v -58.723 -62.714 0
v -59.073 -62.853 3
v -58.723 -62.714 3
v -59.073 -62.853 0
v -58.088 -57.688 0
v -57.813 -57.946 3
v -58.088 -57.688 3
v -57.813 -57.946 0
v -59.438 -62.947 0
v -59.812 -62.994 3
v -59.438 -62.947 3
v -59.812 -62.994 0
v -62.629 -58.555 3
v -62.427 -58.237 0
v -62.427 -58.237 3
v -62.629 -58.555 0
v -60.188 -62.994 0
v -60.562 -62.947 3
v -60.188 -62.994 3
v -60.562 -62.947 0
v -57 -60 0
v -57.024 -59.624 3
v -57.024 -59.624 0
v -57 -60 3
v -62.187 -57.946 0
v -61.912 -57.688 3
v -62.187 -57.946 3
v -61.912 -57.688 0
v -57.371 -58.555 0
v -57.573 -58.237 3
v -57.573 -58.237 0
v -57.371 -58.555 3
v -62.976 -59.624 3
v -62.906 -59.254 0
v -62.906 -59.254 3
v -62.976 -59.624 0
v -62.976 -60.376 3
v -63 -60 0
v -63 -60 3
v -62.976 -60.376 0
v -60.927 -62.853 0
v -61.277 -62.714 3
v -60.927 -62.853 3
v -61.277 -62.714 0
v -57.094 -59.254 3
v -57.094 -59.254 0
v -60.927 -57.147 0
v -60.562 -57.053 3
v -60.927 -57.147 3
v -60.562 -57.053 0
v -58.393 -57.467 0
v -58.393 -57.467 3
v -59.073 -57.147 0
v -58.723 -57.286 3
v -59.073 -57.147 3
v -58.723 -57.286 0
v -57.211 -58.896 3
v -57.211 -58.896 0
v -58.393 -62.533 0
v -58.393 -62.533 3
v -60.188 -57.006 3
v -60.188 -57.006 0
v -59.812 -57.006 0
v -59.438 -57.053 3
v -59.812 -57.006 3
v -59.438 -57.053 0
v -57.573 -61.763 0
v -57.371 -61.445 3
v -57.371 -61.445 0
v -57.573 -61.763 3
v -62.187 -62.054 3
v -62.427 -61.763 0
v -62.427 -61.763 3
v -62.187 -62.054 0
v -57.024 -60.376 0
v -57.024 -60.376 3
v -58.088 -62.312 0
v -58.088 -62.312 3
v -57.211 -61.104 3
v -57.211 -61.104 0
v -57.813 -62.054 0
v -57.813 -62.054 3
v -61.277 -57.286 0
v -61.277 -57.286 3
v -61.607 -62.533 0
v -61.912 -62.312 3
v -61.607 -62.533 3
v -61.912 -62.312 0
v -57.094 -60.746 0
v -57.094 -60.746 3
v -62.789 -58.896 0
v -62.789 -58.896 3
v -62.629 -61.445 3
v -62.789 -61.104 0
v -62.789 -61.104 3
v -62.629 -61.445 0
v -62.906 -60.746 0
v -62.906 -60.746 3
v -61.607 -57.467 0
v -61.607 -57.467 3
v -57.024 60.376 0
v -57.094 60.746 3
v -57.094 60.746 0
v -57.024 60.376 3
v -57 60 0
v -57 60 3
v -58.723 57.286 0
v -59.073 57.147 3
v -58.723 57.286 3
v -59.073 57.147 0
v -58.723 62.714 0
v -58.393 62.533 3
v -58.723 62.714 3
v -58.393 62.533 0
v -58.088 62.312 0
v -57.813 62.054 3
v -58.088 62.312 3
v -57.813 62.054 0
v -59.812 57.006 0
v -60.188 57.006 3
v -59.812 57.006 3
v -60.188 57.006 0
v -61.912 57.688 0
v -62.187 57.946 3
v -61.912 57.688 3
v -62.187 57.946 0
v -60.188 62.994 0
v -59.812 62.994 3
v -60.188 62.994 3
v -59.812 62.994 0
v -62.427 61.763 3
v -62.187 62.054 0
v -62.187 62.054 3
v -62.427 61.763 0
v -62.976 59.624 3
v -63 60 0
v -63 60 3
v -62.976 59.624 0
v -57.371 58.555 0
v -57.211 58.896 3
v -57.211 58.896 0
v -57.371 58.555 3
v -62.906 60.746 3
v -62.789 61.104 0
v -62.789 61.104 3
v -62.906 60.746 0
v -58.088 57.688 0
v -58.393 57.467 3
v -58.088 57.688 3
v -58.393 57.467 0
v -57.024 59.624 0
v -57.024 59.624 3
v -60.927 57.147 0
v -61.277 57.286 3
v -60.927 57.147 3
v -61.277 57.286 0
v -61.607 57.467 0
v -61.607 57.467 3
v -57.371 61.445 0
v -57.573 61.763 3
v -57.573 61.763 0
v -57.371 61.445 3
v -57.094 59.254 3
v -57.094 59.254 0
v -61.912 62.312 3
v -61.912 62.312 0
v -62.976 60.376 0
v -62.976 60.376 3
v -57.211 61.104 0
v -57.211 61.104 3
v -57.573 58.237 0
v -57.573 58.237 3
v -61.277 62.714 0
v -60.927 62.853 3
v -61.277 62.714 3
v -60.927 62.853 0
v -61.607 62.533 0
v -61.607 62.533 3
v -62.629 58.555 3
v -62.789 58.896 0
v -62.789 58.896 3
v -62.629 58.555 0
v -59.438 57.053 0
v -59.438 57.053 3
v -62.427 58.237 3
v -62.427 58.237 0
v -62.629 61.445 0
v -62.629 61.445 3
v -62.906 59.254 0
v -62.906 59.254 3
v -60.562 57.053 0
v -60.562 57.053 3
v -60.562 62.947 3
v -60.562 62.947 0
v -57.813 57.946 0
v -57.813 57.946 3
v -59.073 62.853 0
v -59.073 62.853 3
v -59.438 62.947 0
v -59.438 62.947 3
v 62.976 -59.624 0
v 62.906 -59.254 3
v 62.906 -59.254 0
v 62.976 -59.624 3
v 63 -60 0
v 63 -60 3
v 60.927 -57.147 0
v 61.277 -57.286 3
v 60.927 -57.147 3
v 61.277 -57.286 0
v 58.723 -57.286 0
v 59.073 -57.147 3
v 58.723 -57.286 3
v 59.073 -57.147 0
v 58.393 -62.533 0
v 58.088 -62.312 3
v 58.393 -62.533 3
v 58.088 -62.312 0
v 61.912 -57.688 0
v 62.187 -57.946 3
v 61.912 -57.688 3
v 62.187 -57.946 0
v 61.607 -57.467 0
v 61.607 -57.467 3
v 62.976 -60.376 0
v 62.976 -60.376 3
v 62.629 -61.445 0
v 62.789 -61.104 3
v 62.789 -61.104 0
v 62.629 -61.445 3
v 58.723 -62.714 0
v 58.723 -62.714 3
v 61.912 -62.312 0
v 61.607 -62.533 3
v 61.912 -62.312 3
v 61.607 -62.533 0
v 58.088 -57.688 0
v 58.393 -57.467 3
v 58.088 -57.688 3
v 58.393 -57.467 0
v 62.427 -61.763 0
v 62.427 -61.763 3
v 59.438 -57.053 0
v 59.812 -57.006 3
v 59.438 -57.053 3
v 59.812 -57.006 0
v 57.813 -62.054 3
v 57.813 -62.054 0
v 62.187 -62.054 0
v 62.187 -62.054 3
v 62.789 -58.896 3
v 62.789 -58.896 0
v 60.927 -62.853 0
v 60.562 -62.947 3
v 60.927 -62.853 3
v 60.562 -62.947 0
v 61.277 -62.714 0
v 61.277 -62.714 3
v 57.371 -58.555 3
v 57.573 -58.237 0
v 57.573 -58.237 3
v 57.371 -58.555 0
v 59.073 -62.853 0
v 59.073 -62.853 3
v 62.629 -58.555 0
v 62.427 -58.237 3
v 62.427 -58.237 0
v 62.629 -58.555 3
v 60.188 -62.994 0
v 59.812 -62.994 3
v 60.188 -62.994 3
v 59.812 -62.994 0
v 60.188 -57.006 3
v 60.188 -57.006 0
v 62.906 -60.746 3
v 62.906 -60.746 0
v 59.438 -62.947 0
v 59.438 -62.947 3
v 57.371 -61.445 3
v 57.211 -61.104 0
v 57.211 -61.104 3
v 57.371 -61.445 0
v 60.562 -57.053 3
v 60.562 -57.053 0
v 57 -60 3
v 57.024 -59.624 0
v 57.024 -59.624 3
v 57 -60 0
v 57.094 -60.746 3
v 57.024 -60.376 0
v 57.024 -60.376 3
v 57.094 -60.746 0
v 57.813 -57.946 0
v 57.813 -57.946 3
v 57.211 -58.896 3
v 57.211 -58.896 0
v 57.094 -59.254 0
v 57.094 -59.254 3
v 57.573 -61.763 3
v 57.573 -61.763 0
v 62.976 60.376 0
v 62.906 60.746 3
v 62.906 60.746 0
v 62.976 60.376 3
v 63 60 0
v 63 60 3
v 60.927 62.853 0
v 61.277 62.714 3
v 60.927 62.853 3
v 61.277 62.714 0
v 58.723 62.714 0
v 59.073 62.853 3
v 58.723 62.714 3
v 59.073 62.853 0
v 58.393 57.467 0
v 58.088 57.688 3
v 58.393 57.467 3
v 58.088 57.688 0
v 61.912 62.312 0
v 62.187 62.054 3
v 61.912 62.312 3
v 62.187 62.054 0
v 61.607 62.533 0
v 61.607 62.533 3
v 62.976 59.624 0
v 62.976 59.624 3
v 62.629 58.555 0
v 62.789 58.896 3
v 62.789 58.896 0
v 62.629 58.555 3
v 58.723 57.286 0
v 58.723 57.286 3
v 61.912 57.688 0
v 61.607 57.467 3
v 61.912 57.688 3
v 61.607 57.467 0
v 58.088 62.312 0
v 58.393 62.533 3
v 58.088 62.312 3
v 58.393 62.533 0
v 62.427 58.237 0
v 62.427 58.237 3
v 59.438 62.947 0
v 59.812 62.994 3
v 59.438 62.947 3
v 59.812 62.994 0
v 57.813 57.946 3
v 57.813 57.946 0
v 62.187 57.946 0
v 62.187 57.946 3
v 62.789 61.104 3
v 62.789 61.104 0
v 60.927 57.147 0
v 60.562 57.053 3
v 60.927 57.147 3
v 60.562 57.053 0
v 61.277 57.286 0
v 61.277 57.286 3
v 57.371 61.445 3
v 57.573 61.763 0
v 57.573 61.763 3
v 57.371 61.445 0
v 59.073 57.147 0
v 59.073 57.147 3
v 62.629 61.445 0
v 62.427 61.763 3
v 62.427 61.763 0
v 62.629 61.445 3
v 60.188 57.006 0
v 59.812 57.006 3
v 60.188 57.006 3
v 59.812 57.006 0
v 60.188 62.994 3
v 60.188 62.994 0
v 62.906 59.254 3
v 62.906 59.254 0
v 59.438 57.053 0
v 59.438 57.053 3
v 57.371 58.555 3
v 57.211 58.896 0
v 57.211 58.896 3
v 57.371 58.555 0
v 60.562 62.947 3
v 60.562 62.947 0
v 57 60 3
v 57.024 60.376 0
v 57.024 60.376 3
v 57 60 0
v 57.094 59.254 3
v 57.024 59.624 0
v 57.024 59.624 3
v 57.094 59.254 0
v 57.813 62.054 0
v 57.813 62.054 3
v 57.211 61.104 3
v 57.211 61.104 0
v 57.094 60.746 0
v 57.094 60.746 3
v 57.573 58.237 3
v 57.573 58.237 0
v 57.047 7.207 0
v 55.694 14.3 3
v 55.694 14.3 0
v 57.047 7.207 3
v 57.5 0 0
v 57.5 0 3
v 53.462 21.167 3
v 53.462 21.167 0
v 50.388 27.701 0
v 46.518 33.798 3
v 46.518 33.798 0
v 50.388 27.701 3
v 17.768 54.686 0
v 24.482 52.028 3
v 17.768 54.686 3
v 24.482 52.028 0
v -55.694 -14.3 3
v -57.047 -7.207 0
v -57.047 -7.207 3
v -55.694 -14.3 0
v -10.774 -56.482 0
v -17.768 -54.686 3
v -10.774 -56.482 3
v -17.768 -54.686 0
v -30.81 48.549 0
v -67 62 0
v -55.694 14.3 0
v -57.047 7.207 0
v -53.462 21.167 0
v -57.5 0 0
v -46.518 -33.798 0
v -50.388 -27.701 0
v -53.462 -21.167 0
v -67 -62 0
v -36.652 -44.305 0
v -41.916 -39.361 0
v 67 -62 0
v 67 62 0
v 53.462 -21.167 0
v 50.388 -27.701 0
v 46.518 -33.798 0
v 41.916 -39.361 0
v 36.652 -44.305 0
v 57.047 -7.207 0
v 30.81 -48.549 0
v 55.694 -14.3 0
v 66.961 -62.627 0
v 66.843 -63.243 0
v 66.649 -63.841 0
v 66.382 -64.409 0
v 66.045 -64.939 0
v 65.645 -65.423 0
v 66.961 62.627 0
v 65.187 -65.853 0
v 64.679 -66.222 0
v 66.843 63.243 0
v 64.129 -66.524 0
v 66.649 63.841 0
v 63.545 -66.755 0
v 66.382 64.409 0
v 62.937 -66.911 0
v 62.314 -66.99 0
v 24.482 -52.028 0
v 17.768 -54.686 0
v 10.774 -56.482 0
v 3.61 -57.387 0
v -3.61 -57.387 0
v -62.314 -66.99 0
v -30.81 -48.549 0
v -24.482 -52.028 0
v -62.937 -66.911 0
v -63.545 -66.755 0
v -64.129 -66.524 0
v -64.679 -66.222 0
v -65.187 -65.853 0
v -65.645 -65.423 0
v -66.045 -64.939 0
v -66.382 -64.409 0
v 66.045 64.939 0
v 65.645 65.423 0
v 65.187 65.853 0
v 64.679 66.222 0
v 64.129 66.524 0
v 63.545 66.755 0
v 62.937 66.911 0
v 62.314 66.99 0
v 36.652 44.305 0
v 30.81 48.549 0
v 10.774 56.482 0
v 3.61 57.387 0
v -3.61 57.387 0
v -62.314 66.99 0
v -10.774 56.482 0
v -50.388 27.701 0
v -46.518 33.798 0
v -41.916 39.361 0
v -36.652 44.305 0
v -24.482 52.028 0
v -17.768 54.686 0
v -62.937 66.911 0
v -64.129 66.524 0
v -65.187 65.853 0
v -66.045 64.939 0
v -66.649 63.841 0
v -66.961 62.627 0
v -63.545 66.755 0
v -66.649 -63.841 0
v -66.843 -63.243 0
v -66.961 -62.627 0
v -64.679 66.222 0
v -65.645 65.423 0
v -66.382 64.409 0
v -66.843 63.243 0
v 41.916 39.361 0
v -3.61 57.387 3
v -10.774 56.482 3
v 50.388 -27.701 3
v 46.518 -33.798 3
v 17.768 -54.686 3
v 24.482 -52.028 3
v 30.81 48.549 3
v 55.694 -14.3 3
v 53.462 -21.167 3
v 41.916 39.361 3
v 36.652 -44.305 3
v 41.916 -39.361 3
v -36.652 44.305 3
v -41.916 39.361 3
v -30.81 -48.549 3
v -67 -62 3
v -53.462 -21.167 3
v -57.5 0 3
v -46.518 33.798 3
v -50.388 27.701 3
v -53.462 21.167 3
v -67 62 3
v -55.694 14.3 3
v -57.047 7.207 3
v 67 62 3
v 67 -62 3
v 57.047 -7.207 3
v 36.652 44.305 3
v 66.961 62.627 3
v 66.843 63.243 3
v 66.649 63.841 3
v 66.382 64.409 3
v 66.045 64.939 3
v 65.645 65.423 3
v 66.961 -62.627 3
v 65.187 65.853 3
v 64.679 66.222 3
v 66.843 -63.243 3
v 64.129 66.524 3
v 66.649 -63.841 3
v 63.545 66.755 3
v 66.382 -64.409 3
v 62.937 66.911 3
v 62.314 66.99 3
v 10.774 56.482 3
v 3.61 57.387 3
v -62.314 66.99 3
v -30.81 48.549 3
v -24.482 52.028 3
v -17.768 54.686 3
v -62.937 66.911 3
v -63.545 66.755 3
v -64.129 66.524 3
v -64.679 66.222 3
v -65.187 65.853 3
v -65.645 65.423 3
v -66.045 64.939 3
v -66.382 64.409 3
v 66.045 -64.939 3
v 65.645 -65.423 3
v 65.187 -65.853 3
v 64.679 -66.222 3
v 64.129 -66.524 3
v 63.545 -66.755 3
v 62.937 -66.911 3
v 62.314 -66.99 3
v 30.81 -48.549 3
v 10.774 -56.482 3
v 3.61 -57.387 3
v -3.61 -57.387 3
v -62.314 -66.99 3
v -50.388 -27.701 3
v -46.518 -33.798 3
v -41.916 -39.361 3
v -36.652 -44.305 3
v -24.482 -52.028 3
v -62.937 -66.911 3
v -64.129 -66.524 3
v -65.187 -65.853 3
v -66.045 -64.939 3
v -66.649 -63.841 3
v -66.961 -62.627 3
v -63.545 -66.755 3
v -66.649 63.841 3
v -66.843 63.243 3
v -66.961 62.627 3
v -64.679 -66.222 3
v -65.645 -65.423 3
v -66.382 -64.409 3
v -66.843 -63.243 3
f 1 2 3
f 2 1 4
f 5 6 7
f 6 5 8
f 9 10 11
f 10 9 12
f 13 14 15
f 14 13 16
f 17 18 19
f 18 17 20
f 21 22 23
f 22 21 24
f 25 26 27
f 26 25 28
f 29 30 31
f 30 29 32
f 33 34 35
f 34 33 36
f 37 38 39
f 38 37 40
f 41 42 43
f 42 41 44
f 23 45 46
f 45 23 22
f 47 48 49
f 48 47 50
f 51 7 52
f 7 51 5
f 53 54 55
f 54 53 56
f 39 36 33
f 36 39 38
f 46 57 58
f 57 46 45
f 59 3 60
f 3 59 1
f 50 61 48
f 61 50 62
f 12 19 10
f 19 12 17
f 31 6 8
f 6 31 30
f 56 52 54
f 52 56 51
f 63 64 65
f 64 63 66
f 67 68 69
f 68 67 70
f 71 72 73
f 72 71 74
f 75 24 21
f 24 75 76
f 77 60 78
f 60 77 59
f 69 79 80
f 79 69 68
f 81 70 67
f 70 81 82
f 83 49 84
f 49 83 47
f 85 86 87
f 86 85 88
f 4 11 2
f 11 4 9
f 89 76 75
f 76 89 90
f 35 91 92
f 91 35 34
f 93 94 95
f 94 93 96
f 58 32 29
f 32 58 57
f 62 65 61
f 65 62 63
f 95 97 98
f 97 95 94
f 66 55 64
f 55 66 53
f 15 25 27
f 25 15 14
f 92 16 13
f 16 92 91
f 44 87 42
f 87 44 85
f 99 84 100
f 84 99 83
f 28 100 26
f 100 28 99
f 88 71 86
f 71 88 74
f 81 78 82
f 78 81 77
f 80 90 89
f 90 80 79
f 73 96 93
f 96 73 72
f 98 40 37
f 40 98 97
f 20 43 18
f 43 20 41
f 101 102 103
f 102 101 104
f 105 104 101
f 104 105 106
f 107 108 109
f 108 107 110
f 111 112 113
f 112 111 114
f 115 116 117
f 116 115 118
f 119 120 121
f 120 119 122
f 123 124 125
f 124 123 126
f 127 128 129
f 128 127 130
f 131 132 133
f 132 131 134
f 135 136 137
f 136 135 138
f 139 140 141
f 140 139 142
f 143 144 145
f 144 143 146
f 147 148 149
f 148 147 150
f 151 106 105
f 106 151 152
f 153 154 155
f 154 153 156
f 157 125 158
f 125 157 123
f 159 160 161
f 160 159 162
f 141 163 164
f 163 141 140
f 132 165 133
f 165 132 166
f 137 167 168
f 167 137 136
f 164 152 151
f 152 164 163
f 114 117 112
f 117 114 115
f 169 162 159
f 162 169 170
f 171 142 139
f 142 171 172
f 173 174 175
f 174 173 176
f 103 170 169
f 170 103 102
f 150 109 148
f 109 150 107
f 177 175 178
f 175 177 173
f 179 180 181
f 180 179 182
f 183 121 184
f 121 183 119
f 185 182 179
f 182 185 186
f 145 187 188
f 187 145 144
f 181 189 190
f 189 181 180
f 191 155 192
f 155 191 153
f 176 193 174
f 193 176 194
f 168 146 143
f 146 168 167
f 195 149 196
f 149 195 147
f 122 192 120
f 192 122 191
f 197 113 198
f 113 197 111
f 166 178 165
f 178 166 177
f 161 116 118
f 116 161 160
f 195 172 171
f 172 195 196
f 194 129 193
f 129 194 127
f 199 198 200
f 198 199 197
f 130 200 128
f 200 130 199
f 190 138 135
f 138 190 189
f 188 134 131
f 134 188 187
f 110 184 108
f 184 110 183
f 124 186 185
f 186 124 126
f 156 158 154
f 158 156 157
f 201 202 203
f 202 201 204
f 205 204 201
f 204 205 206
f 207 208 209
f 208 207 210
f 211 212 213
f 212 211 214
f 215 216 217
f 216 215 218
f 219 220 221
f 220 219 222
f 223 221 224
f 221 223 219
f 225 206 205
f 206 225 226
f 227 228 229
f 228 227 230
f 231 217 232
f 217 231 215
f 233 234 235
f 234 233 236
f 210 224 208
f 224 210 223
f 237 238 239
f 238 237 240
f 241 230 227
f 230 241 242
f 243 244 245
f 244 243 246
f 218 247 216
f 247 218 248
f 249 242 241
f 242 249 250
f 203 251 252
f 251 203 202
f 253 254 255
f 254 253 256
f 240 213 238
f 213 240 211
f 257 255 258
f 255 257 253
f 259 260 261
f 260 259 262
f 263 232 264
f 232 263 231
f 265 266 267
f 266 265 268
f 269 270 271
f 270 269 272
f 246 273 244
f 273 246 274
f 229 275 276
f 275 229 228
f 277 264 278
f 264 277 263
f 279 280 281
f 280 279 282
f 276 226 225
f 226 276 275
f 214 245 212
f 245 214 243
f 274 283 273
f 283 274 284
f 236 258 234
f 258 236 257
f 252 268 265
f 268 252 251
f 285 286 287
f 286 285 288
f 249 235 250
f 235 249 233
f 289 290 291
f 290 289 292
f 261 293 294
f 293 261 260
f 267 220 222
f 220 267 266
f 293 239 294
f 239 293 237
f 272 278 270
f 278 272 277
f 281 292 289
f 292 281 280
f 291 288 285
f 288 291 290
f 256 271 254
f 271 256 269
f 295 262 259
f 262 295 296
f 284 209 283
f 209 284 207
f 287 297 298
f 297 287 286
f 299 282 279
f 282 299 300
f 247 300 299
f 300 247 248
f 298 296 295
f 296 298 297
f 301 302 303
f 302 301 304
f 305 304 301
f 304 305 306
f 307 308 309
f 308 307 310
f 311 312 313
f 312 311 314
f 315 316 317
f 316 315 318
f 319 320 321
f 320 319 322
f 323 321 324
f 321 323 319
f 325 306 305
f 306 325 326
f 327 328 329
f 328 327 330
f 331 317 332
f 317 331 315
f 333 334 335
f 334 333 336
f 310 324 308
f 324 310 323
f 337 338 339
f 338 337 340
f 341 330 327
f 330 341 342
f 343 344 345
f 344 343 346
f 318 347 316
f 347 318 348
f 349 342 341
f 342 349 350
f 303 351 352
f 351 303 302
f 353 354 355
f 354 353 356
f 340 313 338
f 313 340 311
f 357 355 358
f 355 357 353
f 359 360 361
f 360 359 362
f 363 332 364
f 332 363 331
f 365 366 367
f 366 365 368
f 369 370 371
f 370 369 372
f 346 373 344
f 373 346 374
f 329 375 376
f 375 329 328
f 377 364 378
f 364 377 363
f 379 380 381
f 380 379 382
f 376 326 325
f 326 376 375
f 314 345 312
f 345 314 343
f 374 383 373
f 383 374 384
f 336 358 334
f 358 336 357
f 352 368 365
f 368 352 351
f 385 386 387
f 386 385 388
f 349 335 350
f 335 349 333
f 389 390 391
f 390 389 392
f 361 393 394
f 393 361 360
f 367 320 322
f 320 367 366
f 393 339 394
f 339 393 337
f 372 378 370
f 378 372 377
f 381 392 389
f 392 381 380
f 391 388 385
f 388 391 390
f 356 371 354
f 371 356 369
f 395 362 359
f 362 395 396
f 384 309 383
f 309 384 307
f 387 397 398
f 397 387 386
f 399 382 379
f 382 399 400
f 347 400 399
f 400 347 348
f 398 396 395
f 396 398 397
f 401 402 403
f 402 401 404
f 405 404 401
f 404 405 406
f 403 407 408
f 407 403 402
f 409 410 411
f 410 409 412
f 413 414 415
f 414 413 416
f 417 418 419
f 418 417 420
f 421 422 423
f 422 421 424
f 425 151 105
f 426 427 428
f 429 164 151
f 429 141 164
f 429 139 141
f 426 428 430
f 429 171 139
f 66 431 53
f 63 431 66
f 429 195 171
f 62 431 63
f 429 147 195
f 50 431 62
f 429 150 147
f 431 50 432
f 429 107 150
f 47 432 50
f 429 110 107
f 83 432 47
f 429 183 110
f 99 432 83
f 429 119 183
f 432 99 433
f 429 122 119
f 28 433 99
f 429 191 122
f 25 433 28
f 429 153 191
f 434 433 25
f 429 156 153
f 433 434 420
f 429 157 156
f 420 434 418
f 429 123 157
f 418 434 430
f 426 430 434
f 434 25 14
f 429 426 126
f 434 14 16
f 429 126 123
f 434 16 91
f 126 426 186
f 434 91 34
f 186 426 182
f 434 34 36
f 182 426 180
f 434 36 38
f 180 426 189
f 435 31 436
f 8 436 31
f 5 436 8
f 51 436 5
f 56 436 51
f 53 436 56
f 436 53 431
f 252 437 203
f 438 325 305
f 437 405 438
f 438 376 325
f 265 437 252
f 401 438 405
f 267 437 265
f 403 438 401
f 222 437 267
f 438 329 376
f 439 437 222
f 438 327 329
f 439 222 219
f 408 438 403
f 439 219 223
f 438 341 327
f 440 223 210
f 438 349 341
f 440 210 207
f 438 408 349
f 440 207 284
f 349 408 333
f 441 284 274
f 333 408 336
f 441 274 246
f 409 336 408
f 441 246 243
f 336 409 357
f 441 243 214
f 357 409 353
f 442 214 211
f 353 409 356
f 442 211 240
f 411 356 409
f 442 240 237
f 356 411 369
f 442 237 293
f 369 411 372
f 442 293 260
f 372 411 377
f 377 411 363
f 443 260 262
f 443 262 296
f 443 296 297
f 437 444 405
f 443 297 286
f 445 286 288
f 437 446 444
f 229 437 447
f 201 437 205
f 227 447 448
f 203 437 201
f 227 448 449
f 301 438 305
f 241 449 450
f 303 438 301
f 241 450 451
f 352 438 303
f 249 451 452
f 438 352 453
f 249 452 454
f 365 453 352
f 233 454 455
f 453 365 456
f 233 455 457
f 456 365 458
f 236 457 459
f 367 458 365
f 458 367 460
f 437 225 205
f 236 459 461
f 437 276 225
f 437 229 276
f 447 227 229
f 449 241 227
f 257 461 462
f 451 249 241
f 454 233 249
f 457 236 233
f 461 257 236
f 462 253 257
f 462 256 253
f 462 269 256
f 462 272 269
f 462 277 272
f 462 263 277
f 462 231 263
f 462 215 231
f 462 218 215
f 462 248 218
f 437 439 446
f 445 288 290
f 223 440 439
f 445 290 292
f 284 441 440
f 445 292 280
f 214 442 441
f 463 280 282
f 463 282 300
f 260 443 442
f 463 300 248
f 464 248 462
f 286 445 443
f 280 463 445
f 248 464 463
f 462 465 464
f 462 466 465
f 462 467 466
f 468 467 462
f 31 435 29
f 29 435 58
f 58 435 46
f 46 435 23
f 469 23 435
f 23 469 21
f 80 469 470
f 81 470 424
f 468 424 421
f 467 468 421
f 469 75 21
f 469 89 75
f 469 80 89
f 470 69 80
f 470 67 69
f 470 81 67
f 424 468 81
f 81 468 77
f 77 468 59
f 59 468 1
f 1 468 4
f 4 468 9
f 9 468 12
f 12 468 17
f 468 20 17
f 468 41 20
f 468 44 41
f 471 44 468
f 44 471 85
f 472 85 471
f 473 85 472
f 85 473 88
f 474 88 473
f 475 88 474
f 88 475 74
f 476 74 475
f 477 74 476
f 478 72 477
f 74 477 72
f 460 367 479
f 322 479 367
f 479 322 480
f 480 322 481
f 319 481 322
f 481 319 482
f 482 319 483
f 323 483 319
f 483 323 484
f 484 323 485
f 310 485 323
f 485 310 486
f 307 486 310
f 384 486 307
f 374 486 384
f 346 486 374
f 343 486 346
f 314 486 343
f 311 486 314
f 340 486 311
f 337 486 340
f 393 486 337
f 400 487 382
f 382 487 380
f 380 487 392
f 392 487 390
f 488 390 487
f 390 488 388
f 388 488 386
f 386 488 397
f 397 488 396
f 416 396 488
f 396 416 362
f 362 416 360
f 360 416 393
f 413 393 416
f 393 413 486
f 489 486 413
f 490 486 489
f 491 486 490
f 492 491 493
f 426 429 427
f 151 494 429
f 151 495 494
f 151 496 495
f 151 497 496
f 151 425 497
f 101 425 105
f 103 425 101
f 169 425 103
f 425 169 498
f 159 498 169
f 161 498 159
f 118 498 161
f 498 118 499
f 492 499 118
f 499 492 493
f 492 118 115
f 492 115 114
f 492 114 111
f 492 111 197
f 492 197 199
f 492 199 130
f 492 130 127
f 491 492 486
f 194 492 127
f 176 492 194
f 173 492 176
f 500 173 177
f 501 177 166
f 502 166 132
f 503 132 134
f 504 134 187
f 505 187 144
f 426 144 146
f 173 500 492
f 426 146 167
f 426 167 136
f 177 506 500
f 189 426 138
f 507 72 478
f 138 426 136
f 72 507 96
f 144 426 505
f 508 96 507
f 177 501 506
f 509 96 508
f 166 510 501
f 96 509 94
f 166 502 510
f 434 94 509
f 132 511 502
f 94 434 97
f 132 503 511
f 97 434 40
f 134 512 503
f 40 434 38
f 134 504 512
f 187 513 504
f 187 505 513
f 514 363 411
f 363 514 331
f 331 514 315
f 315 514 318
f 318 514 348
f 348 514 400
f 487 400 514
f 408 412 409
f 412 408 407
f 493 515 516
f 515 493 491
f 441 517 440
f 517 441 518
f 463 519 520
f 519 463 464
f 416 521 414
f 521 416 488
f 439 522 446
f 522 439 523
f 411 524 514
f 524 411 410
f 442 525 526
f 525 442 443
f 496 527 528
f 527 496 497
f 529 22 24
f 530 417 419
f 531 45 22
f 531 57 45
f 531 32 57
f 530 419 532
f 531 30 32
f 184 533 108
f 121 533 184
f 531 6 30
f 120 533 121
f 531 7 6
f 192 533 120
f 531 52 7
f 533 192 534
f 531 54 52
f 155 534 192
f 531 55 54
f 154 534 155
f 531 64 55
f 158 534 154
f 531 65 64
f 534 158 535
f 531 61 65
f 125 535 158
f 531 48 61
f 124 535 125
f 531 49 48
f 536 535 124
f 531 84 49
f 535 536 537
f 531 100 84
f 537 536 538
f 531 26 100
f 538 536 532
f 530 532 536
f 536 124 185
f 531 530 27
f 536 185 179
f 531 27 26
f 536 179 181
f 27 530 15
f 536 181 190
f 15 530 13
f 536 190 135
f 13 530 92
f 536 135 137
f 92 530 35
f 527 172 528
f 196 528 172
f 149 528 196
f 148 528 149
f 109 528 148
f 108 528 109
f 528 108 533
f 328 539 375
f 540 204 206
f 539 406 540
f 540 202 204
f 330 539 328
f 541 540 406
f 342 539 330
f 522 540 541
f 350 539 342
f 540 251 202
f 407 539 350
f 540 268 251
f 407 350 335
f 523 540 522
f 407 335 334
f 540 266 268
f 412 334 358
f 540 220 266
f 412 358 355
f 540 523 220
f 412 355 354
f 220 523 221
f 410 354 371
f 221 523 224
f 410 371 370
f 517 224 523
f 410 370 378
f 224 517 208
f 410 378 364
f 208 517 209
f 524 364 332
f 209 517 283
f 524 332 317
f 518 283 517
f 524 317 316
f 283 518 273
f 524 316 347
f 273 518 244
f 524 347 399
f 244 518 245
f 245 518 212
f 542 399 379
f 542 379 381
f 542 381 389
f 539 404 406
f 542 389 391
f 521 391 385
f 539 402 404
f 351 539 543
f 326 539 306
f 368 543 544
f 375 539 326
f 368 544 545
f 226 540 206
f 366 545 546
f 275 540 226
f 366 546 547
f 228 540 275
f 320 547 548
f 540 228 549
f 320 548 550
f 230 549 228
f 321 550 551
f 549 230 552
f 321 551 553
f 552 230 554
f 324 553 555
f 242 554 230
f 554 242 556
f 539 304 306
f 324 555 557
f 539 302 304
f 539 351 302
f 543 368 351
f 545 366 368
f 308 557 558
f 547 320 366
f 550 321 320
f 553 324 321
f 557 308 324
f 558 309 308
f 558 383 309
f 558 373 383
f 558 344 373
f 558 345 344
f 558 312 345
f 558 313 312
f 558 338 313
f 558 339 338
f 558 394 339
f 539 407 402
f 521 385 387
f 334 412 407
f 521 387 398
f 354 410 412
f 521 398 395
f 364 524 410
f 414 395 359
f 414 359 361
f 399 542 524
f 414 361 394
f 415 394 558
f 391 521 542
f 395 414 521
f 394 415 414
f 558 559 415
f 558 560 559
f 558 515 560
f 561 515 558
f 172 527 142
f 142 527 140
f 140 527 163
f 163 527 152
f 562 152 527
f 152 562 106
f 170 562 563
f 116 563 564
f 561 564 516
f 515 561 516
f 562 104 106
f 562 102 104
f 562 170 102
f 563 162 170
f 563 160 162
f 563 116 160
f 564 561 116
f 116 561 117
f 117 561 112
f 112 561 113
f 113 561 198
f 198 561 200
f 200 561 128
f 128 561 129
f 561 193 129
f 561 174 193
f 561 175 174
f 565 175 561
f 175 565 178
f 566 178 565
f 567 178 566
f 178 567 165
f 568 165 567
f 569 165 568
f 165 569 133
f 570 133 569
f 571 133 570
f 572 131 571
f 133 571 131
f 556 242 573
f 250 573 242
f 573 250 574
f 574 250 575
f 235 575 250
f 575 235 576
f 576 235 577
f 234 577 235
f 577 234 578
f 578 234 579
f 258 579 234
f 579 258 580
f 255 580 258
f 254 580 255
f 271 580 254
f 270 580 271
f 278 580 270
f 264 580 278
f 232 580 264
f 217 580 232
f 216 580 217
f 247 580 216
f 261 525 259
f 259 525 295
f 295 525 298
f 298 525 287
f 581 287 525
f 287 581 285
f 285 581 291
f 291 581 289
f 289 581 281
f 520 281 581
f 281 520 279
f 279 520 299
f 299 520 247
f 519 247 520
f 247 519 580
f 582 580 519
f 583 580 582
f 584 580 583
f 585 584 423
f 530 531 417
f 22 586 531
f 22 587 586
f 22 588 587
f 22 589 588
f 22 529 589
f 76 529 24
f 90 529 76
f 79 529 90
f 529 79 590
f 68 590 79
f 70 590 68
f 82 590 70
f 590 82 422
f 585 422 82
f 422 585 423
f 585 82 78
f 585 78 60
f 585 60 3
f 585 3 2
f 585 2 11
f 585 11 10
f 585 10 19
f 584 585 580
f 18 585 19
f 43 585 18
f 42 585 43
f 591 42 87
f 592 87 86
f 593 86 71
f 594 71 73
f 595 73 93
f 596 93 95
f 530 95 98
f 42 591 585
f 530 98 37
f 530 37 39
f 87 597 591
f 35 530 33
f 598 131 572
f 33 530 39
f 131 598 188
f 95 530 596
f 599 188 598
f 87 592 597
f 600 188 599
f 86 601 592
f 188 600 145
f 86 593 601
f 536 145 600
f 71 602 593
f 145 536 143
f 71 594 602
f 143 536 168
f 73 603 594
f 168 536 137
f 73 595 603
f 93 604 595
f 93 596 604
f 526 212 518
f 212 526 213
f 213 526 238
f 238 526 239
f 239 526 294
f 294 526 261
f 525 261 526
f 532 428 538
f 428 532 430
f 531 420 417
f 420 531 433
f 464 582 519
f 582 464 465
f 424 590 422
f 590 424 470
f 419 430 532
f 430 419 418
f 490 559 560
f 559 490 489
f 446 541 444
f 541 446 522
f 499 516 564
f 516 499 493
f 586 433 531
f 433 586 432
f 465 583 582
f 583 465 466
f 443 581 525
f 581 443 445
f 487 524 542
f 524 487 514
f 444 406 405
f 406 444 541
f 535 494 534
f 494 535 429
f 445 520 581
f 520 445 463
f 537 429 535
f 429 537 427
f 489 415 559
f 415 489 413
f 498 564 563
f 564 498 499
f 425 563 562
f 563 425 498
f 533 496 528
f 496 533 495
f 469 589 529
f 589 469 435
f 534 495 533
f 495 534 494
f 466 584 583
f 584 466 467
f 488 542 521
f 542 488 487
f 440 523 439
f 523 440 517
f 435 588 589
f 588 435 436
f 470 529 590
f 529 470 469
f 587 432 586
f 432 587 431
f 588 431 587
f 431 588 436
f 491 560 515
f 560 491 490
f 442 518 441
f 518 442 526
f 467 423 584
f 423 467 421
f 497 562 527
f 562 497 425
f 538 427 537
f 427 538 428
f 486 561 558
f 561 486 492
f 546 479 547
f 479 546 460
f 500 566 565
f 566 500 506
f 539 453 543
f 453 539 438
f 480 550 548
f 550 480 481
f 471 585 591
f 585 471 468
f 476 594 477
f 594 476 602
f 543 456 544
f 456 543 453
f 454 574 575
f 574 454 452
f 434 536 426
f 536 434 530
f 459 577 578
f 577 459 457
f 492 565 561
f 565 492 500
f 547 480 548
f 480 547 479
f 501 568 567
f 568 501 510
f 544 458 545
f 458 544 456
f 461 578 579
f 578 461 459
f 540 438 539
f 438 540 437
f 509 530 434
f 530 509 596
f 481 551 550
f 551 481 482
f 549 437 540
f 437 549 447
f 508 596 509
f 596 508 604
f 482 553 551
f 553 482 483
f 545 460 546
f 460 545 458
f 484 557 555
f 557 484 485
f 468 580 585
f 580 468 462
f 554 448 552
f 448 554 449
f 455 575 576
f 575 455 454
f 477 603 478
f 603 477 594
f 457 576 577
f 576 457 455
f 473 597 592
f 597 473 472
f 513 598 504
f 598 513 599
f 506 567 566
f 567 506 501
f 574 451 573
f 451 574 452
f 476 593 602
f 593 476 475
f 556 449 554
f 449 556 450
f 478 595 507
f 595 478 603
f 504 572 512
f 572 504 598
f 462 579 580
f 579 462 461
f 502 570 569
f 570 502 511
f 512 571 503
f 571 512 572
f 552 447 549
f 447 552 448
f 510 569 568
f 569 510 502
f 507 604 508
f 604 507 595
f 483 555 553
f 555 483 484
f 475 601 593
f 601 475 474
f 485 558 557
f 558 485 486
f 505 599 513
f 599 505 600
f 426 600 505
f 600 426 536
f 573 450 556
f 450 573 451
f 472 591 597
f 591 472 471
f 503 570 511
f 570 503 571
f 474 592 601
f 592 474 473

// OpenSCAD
$fn = 50;


difference() {
	union() {
		hull() {
			translate(v = [-62.0000000000, 62.0000000000, 0]) {
				cylinder(h = 3, r = 5);
			}
			translate(v = [62.0000000000, 62.0000000000, 0]) {
				cylinder(h = 3, r = 5);
			}
			translate(v = [-62.0000000000, -62.0000000000, 0]) {
				cylinder(h = 3, r = 5);
			}
			translate(v = [62.0000000000, -62.0000000000, 0]) {
				cylinder(h = 3, r = 5);
			}
		}
	}
	union() {
		#translate(v = [-60.0000000000, -60.0000000000, -100.0000000000]) {
			cylinder(h = 200, r = 3.0000000000);
		}
		#translate(v = [-60.0000000000, 60.0000000000, -100.0000000000]) {
			cylinder(h = 200, r = 3.0000000000);
		}
		#translate(v = [60.0000000000, -60.0000000000, -100.0000000000]) {
			cylinder(h = 200, r = 3.0000000000);
		}
		#translate(v = [60.0000000000, 60.0000000000, -100.0000000000]) {
			cylinder(h = 200, r = 3.0000000000);
		}
		#cylinder(h = 3, r = 57.5000000000);
	}
}
